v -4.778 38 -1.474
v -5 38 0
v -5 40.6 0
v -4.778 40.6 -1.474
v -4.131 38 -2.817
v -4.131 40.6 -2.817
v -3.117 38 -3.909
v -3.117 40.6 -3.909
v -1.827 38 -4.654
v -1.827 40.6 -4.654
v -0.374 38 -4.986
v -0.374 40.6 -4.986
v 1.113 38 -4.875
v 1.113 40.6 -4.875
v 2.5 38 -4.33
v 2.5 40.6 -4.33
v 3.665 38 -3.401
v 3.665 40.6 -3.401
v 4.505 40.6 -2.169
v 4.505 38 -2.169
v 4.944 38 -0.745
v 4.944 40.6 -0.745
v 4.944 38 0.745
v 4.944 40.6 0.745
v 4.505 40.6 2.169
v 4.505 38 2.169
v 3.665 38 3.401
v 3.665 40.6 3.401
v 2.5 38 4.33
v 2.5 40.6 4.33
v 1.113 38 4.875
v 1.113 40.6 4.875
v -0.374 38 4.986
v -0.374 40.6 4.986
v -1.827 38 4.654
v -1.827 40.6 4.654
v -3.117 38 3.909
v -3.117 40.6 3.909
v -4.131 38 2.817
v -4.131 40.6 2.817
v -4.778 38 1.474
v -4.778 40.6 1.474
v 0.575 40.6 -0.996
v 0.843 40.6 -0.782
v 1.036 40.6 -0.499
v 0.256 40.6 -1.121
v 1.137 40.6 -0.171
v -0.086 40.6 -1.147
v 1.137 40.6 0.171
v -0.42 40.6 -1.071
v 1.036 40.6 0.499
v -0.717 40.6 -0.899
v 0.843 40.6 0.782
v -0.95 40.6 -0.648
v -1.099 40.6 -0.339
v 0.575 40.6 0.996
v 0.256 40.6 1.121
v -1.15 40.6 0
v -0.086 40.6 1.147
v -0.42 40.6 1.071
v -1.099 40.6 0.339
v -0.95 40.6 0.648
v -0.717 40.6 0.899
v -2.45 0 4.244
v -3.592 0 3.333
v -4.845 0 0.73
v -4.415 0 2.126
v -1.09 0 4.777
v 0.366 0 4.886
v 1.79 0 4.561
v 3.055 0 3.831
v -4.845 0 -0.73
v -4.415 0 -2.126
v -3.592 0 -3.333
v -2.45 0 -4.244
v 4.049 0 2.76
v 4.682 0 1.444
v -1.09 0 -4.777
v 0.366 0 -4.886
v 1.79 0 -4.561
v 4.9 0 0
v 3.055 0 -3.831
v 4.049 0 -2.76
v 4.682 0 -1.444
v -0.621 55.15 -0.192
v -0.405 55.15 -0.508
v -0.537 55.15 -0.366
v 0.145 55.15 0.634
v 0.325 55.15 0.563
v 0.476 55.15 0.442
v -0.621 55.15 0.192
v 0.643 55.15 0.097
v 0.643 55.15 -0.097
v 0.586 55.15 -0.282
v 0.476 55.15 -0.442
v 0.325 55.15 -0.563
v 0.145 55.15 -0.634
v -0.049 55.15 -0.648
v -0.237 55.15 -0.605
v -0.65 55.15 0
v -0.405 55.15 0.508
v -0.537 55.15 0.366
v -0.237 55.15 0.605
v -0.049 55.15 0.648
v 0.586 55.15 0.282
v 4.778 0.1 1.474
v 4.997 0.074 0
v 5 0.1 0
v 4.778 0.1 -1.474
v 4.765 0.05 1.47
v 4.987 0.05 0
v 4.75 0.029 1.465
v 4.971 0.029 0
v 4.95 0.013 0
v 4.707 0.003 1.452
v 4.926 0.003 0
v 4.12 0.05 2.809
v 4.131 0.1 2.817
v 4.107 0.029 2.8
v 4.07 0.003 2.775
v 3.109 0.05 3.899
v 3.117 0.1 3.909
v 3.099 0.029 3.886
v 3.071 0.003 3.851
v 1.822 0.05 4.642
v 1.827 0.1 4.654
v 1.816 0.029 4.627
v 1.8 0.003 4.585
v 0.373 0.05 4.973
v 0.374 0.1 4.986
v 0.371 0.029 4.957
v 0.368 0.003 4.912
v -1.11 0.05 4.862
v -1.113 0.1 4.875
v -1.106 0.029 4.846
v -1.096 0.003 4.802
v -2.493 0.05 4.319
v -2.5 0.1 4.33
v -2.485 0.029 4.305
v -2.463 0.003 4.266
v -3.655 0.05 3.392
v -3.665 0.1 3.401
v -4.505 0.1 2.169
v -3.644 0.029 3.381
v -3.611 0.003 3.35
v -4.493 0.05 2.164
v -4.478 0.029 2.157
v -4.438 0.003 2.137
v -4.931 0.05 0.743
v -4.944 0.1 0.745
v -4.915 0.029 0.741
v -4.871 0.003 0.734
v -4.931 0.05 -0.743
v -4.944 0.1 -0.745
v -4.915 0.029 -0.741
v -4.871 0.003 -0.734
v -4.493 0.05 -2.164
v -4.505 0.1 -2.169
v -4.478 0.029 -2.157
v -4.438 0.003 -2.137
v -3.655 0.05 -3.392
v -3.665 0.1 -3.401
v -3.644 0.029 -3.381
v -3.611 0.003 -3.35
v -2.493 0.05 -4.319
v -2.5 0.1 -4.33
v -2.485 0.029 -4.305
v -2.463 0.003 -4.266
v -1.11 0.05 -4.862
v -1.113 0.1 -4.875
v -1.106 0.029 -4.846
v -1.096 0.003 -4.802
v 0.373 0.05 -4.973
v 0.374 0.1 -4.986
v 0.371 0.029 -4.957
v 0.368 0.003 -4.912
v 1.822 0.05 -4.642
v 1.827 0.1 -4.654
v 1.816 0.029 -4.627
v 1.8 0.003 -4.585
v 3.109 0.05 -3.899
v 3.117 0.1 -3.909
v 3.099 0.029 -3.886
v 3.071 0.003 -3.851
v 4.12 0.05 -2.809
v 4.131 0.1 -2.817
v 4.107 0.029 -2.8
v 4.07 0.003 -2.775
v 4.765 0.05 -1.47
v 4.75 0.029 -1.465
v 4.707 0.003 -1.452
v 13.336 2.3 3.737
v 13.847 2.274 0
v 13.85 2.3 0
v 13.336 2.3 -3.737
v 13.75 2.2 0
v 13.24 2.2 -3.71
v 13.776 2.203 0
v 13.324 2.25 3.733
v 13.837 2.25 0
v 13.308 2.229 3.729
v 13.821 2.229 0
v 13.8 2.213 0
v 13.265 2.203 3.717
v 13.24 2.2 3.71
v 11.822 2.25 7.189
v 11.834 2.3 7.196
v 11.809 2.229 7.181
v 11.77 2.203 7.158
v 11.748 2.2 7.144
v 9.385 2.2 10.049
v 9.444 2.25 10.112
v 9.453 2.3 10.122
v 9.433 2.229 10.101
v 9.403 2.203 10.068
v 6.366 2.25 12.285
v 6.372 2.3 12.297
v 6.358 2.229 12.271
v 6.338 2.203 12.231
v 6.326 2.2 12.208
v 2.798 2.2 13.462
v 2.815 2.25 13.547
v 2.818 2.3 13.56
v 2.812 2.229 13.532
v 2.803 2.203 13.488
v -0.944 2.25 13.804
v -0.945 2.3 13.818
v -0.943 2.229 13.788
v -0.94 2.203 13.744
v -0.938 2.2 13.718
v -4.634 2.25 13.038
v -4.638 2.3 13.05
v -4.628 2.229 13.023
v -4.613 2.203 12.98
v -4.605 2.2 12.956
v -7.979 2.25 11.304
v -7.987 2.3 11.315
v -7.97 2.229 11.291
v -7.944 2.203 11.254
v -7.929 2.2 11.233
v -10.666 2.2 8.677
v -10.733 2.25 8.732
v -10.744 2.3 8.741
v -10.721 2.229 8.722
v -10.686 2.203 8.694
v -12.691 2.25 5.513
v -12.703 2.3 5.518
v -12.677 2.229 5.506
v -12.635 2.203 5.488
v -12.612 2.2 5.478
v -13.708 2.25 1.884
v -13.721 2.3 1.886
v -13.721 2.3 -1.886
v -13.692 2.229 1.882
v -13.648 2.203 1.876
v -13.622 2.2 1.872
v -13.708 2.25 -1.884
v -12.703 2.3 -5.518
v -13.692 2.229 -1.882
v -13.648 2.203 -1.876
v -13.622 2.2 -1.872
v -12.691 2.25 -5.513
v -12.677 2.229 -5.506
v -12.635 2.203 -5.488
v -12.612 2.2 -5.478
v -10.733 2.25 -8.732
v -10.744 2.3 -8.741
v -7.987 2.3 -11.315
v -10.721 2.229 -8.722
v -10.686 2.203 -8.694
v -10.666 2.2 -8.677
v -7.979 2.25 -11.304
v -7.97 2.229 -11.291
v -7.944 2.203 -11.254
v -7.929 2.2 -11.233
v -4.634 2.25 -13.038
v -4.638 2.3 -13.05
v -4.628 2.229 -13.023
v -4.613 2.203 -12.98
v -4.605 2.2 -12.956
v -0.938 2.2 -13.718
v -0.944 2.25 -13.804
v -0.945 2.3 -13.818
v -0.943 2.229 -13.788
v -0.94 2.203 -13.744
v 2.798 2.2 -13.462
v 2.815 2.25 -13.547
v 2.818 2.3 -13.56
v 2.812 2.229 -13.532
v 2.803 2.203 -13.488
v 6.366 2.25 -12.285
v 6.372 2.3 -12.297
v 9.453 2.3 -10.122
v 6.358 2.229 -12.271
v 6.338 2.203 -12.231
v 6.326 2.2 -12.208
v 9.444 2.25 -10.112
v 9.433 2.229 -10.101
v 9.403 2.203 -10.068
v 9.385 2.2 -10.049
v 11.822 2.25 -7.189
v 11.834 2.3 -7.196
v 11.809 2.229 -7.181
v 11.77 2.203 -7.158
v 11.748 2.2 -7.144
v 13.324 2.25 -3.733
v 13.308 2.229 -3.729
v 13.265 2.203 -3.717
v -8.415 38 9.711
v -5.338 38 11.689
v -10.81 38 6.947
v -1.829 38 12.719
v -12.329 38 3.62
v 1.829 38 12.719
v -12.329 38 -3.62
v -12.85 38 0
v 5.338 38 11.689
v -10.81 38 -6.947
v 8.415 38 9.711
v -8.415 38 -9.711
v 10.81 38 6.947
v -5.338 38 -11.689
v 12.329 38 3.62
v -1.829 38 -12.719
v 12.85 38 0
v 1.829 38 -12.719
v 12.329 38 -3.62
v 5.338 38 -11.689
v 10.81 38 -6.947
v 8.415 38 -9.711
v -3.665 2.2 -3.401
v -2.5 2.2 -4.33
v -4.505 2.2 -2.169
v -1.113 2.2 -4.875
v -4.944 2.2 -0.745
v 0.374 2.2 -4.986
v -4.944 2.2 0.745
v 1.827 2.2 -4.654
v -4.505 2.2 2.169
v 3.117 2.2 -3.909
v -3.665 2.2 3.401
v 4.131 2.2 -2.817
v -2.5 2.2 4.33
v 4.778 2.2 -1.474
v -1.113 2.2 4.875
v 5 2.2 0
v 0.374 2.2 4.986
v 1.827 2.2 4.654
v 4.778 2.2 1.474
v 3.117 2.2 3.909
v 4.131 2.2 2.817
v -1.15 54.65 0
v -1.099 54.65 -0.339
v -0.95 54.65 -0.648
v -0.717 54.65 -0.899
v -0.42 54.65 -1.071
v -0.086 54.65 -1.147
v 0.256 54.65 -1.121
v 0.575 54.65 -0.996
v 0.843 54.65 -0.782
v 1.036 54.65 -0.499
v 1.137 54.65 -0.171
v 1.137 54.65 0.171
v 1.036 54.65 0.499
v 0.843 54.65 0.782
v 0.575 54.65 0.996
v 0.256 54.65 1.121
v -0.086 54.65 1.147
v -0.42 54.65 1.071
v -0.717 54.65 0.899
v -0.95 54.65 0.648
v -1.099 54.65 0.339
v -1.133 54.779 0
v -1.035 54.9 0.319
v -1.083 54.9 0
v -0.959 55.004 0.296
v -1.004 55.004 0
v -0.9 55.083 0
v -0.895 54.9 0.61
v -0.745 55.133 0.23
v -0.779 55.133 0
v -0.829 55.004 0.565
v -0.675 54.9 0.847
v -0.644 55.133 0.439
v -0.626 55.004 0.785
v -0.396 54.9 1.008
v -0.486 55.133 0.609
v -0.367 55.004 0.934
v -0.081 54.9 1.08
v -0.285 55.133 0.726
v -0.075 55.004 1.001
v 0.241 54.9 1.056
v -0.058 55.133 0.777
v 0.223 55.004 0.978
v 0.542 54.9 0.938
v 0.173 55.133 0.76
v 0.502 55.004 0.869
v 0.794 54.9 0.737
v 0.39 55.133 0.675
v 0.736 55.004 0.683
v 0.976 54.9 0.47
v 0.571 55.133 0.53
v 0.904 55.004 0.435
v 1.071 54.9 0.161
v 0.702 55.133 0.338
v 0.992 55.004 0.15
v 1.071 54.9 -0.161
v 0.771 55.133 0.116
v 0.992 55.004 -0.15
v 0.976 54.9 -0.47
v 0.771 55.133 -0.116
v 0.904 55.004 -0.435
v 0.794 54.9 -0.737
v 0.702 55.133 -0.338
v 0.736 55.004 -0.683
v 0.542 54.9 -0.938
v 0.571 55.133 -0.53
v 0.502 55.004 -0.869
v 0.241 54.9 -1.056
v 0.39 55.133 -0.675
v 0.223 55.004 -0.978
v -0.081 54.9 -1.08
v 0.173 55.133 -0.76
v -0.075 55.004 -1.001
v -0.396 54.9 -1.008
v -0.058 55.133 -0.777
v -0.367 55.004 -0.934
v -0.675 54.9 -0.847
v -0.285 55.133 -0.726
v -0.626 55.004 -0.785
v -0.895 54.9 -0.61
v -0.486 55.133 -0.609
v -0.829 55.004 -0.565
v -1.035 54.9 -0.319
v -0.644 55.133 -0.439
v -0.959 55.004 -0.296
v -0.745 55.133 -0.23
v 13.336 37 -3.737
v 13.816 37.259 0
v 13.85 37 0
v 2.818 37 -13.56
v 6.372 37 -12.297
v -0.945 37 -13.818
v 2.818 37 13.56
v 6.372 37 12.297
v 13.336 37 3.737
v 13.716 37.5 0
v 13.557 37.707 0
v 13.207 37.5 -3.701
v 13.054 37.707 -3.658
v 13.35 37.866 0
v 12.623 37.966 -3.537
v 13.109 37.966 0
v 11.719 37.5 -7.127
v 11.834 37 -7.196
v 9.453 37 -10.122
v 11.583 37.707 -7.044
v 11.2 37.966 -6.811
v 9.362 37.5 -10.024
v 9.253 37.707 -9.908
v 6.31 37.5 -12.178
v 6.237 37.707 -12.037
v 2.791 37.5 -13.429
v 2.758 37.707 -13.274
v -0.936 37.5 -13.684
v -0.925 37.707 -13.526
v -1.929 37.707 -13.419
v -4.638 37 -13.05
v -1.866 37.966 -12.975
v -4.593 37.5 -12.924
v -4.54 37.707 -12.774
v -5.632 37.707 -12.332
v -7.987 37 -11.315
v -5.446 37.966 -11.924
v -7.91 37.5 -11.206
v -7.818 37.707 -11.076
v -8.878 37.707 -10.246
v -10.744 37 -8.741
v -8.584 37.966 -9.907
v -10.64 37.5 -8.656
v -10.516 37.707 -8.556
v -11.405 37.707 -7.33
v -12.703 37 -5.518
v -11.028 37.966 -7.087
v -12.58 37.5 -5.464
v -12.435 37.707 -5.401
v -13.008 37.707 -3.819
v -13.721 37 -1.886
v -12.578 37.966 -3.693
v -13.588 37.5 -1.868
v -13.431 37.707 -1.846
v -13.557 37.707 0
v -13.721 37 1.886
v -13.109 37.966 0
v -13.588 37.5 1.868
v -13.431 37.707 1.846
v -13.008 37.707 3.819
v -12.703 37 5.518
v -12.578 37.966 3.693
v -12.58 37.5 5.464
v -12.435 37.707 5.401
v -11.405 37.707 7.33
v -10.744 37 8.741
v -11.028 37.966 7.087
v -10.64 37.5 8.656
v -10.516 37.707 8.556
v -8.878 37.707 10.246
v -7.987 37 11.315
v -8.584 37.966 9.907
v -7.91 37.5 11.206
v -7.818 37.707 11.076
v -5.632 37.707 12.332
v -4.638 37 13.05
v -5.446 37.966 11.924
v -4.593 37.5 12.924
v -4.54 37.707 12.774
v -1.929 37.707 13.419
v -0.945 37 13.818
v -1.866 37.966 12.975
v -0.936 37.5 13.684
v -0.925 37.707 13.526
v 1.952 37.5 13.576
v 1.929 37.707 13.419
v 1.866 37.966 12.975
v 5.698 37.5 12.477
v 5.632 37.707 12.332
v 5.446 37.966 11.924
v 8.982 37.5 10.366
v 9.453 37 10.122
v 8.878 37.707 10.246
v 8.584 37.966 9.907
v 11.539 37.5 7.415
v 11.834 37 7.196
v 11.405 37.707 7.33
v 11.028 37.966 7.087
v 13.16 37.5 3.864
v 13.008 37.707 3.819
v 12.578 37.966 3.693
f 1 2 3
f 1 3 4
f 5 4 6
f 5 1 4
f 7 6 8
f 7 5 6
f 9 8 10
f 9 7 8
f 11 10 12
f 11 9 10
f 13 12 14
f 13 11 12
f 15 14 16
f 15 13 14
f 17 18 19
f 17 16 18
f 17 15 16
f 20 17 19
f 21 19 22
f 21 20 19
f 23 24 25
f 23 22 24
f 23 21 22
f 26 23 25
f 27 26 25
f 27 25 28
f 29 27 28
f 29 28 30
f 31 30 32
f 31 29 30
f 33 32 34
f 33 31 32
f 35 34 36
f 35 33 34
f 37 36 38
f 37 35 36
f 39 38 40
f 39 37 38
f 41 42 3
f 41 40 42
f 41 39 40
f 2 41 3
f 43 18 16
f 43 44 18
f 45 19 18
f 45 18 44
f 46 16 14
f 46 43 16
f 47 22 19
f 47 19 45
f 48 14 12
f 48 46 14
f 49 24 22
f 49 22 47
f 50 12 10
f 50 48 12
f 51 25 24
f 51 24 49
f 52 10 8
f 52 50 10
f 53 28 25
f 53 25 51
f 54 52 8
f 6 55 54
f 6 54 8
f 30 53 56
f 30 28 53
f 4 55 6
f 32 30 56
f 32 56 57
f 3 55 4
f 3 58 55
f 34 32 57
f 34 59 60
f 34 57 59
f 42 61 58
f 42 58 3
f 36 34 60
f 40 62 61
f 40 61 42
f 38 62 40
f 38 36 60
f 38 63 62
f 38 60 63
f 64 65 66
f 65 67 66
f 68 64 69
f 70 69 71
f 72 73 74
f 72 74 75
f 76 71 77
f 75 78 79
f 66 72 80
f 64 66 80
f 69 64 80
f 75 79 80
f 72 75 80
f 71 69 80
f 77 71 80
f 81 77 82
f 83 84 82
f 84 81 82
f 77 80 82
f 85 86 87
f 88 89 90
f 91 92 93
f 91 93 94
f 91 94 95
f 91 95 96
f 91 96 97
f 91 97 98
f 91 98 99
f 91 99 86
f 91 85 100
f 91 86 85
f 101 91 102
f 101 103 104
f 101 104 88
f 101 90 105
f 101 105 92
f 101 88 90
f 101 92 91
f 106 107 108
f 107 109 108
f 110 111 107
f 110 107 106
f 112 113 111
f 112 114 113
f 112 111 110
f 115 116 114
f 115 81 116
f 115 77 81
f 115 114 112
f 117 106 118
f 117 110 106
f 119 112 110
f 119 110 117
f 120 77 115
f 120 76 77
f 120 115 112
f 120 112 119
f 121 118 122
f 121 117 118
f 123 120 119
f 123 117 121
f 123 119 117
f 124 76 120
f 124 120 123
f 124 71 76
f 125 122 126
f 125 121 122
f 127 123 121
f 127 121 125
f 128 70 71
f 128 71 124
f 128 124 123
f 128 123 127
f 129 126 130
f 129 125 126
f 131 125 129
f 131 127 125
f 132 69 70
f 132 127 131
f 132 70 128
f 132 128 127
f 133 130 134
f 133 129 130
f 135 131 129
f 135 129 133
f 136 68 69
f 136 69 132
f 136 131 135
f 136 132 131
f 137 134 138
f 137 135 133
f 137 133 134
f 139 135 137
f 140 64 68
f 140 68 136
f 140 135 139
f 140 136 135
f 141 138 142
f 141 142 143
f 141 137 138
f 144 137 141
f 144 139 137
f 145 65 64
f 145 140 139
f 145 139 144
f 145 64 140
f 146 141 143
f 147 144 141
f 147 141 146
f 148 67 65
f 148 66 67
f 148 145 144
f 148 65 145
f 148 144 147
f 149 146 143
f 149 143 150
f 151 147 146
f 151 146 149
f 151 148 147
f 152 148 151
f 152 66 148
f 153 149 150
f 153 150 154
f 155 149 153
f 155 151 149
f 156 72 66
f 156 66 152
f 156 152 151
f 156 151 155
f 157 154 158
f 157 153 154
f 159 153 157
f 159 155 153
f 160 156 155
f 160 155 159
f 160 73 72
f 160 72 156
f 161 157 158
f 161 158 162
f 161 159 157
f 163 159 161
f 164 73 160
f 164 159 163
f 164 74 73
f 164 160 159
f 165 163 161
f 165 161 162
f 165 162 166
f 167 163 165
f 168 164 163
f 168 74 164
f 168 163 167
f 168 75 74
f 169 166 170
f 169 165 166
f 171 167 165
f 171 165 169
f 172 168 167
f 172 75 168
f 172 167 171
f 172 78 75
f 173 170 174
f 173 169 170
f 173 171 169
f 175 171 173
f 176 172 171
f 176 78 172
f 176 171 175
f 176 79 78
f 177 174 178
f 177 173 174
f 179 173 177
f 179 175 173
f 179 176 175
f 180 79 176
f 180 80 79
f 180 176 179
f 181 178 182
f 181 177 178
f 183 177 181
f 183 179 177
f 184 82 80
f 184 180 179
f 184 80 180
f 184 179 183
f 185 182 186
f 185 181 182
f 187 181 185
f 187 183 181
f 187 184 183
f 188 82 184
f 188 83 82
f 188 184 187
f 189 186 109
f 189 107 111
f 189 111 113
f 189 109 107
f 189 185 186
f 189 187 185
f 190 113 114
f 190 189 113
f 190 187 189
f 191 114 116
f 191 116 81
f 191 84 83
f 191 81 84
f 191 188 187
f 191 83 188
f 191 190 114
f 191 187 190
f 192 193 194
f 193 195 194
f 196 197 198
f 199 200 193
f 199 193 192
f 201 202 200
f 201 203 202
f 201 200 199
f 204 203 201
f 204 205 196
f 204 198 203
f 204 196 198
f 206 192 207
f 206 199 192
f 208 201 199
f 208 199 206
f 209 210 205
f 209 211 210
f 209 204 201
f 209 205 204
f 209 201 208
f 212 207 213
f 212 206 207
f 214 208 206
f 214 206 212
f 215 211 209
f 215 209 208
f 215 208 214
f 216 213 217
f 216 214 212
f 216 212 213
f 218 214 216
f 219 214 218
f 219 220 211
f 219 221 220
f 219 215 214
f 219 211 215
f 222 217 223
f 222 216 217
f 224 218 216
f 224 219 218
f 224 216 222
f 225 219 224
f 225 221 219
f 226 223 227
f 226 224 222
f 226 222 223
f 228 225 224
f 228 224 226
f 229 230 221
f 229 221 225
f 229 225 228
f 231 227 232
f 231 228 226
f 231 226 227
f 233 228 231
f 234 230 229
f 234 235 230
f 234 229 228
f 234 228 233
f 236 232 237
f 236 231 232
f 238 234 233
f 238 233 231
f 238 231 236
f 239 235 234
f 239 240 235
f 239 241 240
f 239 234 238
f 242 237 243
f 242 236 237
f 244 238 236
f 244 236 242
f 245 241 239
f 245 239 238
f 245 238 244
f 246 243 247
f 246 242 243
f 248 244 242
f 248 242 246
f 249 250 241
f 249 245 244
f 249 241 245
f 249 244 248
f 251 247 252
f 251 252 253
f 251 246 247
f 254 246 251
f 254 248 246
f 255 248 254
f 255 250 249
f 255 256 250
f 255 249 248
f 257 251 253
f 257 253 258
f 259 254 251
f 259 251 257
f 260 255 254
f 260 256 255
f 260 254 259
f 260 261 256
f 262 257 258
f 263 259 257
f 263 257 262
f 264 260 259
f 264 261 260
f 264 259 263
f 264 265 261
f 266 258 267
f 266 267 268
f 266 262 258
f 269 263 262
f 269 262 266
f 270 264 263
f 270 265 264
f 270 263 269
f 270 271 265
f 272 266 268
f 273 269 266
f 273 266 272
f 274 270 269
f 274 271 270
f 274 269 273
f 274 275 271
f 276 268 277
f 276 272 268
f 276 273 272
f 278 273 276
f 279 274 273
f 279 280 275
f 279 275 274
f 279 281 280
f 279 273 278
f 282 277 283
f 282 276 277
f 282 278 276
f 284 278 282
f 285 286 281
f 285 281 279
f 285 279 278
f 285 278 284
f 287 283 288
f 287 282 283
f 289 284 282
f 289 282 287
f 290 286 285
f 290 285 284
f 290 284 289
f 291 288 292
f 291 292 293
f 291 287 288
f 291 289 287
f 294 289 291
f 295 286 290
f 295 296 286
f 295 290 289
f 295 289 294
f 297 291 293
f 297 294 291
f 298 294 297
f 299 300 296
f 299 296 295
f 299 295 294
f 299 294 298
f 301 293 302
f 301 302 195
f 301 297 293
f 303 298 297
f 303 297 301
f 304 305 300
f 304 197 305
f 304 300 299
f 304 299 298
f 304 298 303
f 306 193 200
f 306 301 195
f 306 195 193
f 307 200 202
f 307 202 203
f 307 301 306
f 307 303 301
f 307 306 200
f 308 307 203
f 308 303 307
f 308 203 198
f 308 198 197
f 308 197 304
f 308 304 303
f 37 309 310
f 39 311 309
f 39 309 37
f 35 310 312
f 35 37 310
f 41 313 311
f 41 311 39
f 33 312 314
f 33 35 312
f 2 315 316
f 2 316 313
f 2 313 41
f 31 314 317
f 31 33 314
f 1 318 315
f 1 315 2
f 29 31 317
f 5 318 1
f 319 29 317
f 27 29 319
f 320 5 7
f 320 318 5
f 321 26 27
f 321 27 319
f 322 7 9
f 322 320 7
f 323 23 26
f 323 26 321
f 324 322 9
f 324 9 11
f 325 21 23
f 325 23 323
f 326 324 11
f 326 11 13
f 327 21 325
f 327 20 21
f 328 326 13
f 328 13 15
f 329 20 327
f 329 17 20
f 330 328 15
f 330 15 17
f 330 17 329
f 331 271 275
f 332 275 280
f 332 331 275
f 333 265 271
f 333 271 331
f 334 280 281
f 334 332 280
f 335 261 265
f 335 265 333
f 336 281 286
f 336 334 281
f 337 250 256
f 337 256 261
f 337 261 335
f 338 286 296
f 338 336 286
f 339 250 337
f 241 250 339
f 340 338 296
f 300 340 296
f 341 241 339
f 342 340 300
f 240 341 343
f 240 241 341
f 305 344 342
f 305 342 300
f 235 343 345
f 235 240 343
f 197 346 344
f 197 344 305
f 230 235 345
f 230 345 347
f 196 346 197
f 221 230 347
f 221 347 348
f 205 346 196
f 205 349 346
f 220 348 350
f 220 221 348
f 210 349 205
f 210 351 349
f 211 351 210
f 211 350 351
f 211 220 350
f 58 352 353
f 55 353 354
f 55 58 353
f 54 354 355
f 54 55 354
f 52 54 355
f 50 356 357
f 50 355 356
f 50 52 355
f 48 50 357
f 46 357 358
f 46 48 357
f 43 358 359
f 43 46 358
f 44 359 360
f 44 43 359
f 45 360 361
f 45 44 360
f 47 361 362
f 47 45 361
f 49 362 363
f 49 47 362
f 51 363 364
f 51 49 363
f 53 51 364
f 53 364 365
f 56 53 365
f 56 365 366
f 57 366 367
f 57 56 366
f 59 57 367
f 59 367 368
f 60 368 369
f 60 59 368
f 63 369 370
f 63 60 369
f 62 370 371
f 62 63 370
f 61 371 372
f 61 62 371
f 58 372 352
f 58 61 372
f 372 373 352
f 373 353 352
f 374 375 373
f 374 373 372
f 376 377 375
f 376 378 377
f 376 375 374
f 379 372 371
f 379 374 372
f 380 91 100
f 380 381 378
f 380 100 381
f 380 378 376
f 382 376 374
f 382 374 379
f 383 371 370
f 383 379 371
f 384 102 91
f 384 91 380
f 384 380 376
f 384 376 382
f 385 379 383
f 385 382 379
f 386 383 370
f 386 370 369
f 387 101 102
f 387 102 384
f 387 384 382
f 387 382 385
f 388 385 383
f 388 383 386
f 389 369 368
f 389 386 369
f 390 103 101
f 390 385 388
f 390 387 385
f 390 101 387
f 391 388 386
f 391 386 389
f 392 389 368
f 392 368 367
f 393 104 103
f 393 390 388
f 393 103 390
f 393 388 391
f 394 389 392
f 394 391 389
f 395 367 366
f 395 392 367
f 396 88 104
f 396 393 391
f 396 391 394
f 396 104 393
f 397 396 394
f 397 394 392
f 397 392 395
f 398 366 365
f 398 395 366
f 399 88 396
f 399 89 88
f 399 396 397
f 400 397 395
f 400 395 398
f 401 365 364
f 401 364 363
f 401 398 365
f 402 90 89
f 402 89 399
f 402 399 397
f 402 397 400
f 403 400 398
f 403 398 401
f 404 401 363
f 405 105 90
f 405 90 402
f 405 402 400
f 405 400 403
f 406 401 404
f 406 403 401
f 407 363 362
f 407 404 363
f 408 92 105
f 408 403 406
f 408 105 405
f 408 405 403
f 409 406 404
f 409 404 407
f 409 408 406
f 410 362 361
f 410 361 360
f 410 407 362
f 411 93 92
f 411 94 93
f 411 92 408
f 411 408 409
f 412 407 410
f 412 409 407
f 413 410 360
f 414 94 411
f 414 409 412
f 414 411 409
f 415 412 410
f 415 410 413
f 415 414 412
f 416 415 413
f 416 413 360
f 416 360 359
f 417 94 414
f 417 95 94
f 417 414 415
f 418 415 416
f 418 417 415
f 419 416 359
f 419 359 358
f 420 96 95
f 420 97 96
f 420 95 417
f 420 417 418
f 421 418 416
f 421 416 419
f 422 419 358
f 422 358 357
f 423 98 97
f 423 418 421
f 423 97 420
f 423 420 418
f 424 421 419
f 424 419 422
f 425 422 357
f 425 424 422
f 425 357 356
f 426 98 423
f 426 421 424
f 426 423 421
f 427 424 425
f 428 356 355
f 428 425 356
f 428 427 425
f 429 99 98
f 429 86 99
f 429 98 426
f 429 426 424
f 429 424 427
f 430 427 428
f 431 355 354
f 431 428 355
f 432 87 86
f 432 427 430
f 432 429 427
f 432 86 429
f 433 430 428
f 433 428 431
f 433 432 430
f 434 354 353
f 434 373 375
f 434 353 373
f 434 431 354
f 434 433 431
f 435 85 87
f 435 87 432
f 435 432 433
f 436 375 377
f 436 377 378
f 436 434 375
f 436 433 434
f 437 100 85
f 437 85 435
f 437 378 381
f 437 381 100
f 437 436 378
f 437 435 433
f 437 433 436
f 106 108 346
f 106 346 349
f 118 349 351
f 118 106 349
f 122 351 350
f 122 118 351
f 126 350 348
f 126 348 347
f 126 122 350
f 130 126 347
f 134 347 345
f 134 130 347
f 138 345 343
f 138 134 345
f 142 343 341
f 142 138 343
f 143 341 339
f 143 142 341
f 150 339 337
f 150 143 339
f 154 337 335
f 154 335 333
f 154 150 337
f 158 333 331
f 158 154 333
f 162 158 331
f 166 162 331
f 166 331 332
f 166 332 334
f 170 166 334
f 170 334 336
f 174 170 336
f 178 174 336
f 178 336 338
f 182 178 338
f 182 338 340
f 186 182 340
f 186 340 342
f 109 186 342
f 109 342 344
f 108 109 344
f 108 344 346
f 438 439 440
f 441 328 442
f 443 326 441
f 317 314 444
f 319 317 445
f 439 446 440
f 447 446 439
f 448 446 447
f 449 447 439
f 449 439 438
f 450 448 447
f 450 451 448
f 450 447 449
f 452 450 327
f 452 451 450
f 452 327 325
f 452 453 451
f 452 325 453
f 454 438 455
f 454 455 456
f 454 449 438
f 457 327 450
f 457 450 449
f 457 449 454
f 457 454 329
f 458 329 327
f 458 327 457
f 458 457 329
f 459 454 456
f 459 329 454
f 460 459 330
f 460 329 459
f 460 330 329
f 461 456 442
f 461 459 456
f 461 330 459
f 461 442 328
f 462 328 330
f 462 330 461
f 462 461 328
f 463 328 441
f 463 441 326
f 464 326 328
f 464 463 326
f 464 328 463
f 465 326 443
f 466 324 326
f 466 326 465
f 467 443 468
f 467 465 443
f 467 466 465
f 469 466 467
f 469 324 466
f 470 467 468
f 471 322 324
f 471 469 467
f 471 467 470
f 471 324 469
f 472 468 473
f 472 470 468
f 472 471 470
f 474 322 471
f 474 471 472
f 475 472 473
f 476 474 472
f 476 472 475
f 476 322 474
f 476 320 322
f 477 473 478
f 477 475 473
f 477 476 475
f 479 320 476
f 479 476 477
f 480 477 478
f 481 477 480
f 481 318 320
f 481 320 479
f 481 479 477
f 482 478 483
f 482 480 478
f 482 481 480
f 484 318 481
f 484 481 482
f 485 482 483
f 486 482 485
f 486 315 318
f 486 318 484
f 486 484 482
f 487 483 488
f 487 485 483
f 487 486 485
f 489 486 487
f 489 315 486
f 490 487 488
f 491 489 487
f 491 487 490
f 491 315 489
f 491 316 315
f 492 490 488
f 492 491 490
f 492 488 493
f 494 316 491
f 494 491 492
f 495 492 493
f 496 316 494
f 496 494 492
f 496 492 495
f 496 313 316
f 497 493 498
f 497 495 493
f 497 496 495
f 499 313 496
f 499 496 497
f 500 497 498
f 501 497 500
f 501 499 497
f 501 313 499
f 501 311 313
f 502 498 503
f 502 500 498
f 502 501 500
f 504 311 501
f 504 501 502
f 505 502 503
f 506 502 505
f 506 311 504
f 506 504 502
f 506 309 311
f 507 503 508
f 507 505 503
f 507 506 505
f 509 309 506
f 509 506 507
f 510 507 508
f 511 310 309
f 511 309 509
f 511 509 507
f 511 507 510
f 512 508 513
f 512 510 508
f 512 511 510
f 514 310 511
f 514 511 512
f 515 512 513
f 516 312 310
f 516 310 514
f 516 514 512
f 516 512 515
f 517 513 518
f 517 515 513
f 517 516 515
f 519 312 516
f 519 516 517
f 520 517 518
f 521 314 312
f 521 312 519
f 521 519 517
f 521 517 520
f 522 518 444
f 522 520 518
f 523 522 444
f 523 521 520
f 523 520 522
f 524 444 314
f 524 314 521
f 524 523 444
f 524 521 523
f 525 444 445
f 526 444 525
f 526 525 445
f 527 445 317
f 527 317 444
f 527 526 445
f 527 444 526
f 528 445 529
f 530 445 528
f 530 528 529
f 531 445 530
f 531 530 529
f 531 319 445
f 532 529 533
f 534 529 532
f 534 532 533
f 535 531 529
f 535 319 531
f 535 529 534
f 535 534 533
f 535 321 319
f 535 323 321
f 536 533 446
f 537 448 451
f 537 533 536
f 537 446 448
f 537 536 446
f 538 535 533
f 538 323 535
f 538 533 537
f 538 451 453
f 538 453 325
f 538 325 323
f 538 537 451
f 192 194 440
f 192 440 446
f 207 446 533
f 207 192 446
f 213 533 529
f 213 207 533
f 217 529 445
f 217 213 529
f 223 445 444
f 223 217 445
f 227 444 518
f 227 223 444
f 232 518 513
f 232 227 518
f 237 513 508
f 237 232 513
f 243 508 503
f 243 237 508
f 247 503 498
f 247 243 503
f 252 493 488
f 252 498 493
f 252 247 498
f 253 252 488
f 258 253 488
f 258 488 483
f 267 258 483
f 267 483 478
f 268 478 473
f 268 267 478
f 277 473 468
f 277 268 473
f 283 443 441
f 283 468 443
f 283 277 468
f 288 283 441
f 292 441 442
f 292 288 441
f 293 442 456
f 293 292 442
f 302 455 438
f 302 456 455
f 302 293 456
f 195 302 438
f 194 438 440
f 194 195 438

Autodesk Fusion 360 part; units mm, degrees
sketch "Sketch1" plane through (0, 0, 0) normal (0, 1, 0) x (1, 0, 0)
  circle A0 centre (0, 0) radius 13.85
  dimension "d1" = 27.7
extrude "Extrude1" add sketch "Sketch1" along normal blind 38
sketch "Sketch2" plane through (0, 38, 0) normal (0, 1, 0) x (-1, 0, 0)
  circle A0 centre (0, 0) radius 13.85
  circle A1 centre (0, 0) radius 5
  dimension "d4" = 10
extrude "Extrude2" add sketch "Sketch2" along normal blind 2.6 contours A1
sketch "Sketch3" plane through (0, 40.6, 0) normal (0, 1, 0) x (-1, 0, 0)
  circle A0 centre (0, 0) radius 5
  circle A1 centre (0, 0) radius 1.15
  dimension "d7" = 2.3
extrude "Extrude3" add sketch "Sketch3" along normal blind 14.55 contours A1
sketch "Sketch4" plane through (0, 0, 0) normal (0, -1, 0) x (1, 0, 0)
  circle A0 centre (0, 0) radius 13.85
  circle A1 centre (0, 0) radius 5
  dimension "d10" = 10
extrude "Extrude4" cut sketch "Sketch4" against normal blind 2.2
fillet "Fillet1" radius 1 1 edges at (-12.9127, 38, 5.0084)
fillet "Fillet2" radius 0.5 1 edges at (1.0722, 55.15, -0.4159)
fillet "Fillet3" radius 0.1 2 edges at (-12.9127, 2.2, 5.0084) (-4.6616, 0, -1.8081)
